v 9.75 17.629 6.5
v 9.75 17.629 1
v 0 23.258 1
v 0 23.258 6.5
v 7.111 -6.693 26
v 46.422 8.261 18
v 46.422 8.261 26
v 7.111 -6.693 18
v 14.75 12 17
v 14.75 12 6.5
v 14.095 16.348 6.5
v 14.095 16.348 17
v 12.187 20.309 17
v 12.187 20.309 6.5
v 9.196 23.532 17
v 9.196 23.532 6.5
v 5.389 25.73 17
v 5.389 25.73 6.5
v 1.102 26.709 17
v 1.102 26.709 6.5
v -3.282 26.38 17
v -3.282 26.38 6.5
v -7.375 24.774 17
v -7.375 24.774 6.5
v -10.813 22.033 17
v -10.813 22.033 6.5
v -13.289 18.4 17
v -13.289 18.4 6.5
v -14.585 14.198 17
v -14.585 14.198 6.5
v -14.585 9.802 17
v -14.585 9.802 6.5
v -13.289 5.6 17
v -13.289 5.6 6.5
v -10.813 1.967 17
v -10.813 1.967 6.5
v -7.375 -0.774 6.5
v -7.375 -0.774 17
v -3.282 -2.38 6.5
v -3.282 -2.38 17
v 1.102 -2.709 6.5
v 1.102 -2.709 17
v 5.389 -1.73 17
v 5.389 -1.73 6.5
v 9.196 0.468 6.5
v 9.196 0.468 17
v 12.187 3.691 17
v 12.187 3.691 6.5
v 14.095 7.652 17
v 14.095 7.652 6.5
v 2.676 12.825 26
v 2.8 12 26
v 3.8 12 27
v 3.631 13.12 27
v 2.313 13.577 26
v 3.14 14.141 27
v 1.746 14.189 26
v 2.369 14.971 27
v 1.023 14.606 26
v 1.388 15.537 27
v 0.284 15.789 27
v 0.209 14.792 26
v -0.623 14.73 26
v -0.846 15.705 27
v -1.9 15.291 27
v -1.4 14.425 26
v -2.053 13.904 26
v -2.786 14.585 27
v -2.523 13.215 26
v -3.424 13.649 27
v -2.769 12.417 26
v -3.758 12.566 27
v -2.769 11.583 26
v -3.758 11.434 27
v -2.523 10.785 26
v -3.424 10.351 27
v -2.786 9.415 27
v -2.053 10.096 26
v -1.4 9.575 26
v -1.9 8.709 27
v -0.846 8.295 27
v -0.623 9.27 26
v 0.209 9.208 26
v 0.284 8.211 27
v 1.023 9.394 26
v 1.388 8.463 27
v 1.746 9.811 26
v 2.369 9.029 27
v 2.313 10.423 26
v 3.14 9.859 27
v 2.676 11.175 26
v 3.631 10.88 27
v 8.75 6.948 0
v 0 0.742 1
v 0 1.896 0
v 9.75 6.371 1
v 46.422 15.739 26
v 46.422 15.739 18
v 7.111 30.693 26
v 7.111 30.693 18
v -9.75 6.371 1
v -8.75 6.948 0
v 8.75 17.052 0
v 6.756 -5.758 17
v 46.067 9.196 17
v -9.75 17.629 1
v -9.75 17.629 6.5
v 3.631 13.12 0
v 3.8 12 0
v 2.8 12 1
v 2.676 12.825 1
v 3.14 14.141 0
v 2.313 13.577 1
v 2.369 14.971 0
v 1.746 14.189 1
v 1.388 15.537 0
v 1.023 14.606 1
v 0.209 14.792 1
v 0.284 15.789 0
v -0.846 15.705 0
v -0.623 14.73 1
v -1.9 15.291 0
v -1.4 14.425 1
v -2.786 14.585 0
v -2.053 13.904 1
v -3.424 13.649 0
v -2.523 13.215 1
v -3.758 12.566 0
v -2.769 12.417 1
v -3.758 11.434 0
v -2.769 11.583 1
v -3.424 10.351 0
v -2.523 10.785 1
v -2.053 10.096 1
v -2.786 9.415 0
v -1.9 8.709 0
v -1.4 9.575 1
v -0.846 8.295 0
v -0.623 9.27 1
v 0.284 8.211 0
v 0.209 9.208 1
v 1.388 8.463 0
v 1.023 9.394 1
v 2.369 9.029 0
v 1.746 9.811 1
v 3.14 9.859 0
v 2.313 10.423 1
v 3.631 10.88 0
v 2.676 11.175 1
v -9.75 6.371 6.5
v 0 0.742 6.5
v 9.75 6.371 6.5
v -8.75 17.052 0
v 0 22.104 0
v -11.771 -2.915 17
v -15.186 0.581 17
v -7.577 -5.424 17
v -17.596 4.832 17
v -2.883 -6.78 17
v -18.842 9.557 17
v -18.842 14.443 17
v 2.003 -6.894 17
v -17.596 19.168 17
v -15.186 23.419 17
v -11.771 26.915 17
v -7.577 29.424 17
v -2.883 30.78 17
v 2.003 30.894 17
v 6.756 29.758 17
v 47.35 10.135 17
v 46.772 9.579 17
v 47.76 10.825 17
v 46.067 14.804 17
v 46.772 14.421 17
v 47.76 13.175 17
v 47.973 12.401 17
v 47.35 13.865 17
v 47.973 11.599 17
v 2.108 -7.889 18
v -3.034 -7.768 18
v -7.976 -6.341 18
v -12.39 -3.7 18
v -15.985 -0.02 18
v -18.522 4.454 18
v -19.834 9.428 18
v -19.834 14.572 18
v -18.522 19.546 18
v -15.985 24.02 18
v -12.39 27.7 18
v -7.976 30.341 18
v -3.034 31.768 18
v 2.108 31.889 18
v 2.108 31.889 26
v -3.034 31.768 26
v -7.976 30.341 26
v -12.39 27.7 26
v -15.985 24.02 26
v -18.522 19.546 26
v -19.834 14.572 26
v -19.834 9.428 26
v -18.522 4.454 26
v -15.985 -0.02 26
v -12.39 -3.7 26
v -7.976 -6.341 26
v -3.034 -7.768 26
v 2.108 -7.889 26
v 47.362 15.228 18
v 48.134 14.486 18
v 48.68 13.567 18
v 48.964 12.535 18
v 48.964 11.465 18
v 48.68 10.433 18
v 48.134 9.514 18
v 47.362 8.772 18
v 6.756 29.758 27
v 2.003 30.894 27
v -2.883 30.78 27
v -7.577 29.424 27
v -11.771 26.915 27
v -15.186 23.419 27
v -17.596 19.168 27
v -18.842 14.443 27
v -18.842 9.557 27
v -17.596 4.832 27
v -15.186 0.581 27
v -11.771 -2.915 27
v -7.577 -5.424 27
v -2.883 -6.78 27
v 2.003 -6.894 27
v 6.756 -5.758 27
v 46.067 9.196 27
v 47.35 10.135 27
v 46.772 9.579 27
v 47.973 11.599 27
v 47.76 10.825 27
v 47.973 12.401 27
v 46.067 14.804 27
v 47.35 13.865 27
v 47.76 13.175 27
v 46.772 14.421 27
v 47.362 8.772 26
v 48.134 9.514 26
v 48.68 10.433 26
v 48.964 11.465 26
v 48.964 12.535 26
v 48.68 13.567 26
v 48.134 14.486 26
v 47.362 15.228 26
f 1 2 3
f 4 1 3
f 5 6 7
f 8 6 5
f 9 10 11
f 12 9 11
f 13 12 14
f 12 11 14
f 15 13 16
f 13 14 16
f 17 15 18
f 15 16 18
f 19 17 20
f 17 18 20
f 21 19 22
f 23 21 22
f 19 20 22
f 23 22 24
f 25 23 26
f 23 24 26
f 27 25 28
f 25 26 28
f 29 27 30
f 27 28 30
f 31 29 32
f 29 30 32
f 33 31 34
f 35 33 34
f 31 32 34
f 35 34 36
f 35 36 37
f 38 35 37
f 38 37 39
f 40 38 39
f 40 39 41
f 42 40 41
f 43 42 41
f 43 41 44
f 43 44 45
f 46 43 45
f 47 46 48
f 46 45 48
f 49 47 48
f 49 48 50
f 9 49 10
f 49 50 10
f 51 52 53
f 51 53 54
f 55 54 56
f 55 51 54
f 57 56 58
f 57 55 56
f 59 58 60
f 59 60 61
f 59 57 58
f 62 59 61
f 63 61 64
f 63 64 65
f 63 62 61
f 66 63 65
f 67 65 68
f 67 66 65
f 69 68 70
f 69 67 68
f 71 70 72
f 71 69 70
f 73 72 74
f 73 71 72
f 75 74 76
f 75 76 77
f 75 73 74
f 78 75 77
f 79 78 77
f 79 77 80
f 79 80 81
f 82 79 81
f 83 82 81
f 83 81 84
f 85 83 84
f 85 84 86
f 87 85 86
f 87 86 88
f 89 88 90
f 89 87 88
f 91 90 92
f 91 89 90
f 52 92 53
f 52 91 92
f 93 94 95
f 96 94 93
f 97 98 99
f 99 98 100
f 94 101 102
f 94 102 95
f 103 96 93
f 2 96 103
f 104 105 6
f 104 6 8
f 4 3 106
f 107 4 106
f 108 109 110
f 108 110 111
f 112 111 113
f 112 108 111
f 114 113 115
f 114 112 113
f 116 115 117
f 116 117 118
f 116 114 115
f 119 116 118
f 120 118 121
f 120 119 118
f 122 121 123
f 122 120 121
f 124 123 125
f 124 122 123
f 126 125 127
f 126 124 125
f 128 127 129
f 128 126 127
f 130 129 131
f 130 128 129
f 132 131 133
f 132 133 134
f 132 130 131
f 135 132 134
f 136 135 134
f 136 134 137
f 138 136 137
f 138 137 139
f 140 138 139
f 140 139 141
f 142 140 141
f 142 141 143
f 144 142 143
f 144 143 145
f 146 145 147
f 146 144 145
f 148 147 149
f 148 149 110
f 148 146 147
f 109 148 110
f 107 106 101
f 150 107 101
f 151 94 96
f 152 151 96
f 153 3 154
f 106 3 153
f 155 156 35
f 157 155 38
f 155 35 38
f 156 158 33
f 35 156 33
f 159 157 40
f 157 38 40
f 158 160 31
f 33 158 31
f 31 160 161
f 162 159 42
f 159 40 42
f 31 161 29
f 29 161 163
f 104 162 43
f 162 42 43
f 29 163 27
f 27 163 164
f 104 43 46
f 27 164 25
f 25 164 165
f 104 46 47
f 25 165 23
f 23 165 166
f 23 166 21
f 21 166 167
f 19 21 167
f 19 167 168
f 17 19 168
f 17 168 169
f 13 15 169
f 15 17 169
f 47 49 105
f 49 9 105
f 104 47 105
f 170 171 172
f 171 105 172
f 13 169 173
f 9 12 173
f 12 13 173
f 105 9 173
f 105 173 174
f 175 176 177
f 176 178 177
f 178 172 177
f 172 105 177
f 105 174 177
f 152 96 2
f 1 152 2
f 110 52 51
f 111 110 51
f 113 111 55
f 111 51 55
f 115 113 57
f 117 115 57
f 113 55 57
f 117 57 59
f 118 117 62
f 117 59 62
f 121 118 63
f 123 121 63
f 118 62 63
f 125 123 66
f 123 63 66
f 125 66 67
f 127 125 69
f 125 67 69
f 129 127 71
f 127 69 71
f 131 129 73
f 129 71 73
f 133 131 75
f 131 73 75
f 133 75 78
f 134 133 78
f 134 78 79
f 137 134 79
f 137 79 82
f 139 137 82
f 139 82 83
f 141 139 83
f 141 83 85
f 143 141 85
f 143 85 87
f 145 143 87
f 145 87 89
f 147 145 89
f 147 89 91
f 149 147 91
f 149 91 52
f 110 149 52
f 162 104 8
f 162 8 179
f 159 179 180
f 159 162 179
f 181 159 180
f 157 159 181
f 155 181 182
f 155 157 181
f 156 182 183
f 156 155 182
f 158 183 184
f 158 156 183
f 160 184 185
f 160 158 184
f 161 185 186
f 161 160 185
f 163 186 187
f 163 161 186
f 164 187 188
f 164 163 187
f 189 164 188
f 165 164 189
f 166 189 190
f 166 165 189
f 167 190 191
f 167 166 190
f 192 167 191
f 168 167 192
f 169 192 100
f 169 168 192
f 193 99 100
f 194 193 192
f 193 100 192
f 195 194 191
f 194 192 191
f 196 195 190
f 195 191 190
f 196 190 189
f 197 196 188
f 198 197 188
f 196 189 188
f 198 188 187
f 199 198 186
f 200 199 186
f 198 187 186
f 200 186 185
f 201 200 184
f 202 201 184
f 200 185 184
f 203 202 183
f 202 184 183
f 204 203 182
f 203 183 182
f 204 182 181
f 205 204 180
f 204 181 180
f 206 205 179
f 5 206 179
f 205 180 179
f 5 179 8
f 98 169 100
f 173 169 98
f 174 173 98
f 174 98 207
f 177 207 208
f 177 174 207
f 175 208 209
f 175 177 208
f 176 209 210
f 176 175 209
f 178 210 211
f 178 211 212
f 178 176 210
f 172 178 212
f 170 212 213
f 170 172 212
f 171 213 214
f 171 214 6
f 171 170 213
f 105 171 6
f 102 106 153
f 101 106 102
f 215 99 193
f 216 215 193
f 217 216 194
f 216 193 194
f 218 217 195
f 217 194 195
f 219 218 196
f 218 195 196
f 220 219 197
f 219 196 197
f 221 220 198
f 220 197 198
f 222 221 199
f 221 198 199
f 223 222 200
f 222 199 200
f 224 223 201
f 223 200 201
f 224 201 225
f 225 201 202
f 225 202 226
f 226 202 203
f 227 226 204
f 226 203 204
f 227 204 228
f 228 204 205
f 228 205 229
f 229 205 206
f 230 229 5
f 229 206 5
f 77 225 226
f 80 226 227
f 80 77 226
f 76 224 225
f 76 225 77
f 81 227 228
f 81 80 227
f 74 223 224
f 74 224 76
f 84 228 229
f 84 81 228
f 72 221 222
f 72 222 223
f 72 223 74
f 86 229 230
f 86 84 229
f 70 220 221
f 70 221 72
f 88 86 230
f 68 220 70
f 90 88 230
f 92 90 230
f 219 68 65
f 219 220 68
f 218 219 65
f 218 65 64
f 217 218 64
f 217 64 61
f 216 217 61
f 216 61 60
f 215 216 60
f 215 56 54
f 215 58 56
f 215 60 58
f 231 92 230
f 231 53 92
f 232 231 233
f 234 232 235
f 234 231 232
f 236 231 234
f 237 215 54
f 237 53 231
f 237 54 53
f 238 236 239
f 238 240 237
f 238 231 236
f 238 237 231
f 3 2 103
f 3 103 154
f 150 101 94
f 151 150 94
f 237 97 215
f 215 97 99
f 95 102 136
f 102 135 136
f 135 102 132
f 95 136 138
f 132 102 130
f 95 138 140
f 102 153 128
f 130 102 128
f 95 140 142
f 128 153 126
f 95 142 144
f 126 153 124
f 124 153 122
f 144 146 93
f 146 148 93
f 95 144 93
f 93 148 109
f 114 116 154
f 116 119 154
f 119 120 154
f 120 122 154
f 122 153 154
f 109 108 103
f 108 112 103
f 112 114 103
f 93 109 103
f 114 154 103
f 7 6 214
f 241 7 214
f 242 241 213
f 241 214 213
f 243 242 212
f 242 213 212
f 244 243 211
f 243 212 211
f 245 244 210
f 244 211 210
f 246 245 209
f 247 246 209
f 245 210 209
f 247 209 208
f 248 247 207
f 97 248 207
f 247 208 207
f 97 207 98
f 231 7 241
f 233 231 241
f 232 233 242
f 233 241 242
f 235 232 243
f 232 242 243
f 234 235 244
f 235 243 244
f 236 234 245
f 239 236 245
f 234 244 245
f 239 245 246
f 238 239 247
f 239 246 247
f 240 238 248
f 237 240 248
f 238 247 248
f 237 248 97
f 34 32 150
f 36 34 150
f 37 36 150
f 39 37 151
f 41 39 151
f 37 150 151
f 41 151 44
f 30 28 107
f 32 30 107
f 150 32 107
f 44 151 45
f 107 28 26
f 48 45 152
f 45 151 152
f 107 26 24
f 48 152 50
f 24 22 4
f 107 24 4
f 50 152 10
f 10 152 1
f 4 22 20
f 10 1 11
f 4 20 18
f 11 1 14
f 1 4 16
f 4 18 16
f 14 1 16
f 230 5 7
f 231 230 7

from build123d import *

# Parameters (mm, degrees)
PAD003_DEPTH    = 6.5
SKETCH007_R     = 14.75
PAD004_DEPTH    = 10.5
PAD005_DEPTH    = 10
SKETCH009_R     = 2.8
POCKET002_DEPTH = 27.001
CHAMFER_SIZE    = 1


with BuildPart() as part:
    # Sketch006 → Pad003 (new body)
    with BuildSketch(Plane.XY):
        Polygon((0, -11.25833), (9.75, -5.629165), (9.75, 5.629165), (0, 11.25833), (-9.75, 5.629165), (-9.75, -5.629165), align=None)
    extrude(amount=PAD003_DEPTH)

    # Sketch007 (on Face8 of Pad003) → Pad004 (join)
    with BuildSketch(Plane.XY.offset(6.5)):
        Circle(SKETCH007_R)
    extrude(amount=PAD004_DEPTH)

    # Sketch008 (on Face3 of Pad004) → Pad005 (join)
    with BuildSketch(Plane.XY.offset(17)):
        with BuildLine():
            ThreePointArc((7.111111, 18.693103), (-20, 0), (7.111111, -18.693103))
            Line((46.422222, -3.738621), (7.111111, -18.693103))
            ThreePointArc((46.422222, -3.738621), (49, 0), (46.422222, 3.738621))
            Line((46.422222, 3.738621), (7.111111, 18.693103))
        make_face()
    extrude(amount=PAD005_DEPTH)

    # Sketch009 (on Face5 of Pad005) → Pocket002 (cut, through all)
    with BuildSketch(Plane.XY.offset(27)):
        Circle(SKETCH009_R)
    extrude(amount=-POCKET002_DEPTH, mode=Mode.SUBTRACT)

    # Chamfer
    chamfer_edges = [part.edges().sort_by_distance(p)[0] for p in [
        (49, 0, 27),
        (26.766667, -11.215862, 27),
        (26.766667, 11.215862, 27),
        (-20, 0, 27),
        (-2.8, 0, 27),
        (26.766667, -11.215862, 17),
        (4.875, -8.443748, 0),
        (-4.875, -8.443748, 0),
        (9.75, 0, 0),
        (-9.75, 0, 0),
        (4.875, 8.443748, 0),
        (-4.875, 8.443748, 0),
        (-2.8, 0, 0),
    ]]
    chamfer(chamfer_edges, length=CHAMFER_SIZE)


with BuildPart() as part_1:
    # Body002 placement: moved
    add(part.part.moved(Location((0, 12, 0))))


solid = part_1.part
